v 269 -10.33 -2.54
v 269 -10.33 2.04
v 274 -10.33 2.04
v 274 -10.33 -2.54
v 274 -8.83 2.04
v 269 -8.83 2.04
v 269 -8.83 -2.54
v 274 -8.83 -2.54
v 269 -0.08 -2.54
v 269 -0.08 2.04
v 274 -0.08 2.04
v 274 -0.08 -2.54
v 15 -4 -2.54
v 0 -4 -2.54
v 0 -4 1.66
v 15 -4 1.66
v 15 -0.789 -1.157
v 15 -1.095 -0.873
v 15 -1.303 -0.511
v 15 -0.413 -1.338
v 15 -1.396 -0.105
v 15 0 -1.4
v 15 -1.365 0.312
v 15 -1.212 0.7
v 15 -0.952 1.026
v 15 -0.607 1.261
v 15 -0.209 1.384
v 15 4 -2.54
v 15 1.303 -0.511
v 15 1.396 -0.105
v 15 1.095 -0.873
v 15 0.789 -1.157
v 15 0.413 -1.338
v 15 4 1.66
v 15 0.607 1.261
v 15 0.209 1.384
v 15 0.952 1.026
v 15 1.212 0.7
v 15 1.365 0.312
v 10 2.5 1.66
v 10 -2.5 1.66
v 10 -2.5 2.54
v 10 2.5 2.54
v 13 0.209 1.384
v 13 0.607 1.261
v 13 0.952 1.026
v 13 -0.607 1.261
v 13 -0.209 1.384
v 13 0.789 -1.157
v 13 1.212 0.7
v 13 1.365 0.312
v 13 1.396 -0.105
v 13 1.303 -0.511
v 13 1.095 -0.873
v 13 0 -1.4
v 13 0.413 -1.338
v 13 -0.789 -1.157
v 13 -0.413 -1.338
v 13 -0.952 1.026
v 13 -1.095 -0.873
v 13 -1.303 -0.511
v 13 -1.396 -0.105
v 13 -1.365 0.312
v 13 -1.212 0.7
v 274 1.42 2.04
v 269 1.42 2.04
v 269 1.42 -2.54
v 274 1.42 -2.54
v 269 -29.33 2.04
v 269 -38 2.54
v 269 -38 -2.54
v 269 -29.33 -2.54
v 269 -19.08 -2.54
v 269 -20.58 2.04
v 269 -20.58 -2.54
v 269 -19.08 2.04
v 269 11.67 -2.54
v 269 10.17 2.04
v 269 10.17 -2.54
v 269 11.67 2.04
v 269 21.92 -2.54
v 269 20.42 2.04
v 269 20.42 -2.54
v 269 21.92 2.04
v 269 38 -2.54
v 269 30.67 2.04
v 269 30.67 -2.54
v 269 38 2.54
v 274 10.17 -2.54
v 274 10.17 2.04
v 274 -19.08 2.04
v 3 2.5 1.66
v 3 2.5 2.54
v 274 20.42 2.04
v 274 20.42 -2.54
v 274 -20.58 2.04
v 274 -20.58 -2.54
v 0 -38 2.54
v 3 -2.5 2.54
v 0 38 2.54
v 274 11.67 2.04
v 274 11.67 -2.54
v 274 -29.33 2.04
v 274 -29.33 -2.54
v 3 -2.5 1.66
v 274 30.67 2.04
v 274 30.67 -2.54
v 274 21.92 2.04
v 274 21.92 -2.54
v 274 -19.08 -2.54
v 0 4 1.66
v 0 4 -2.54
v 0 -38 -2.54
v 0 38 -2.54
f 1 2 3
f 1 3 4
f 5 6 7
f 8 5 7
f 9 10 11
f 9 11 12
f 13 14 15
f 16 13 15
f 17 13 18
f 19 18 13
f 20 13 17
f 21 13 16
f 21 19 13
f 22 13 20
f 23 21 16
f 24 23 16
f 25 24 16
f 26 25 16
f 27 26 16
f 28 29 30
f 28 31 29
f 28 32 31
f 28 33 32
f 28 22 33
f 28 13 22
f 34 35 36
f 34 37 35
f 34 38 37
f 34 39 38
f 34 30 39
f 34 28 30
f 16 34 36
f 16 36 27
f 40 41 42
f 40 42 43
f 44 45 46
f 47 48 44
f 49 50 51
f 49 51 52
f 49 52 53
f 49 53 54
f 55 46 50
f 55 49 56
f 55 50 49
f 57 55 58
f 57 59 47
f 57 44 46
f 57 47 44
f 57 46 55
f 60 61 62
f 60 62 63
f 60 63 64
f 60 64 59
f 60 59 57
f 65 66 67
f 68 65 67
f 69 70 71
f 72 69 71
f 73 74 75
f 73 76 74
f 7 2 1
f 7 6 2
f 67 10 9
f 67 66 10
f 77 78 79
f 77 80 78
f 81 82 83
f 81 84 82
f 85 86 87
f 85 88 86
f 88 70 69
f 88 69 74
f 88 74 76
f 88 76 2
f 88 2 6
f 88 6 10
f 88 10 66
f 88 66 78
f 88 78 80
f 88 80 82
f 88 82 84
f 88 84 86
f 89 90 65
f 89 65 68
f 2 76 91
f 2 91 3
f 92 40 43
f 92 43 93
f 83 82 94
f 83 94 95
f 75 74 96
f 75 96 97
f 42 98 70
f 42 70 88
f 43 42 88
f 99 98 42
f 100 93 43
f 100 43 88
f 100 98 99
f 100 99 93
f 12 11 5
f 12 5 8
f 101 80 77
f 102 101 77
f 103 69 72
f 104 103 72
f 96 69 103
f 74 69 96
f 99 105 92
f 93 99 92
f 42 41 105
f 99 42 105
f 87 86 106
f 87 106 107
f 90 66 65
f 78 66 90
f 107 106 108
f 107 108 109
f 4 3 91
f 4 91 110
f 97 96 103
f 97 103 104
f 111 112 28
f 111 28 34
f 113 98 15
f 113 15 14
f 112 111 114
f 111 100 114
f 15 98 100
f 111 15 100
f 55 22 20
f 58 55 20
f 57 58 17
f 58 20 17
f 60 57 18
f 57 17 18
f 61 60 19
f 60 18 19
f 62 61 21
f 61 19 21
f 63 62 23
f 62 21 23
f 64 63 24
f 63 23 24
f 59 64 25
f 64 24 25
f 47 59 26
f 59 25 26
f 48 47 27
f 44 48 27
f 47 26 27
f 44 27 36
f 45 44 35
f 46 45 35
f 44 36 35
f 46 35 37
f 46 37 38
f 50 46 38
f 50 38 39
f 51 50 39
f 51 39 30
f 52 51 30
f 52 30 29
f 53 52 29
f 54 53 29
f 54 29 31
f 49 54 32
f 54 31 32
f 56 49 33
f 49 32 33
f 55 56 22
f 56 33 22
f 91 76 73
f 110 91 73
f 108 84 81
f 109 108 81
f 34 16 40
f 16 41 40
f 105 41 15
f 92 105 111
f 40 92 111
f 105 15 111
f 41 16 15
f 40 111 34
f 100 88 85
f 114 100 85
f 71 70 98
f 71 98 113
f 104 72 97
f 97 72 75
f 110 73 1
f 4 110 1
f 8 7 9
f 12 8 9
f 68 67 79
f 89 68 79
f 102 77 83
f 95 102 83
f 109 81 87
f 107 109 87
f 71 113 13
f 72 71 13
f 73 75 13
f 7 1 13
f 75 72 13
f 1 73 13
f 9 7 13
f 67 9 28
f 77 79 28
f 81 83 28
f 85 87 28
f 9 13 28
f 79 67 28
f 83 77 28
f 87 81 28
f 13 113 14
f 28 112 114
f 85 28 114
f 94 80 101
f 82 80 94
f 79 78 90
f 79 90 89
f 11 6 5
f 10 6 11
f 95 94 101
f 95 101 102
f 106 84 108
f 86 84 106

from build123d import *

# Parameters (mm, degrees)
SKETCH1_W           = 5.08
SKETCH1_H           = 76
BOSS_EXTRUDE1_DEPTH = 269
SKETCH2_W           = 4.58
SKETCH2_H           = 8.75
BOSS_EXTRUDE2_DEPTH = 5
SKETCH5_W           = 4.2
SKETCH5_H           = 8
CUT_EXTRUDE1_DEPTH  = 15
SKETCH6_W           = 7
SKETCH6_H           = 5
CUT_EXTRUDE2_DEPTH  = 15
SKETCH8_R           = 1.4
BOSS_EXTRUDE3_DEPTH = 2


with BuildPart() as part:
    # Sketch1 → Boss-Extrude1 (new body)
    with BuildSketch(Plane(origin=(0, 0, 0), x_dir=(0, 0, -1), z_dir=(1, 0, 0))):
        Rectangle(SKETCH1_W, SKETCH1_H)
    extrude(amount=BOSS_EXTRUDE1_DEPTH)

    # Sketch2 → Boss-Extrude2 (add)
    with BuildSketch(Plane(origin=(269, 0, 0), x_dir=(0, 0, -1), z_dir=(1, 0, 0))):
        with Locations((0.25, 26.295)):
            Rectangle(SKETCH2_W, SKETCH2_H)
        with Locations((0.25, 5.795)):
            Rectangle(SKETCH2_W, SKETCH2_H)
        with Locations((0.25, 16.045)):
            Rectangle(SKETCH2_W, SKETCH2_H)
        with Locations((0.25, -4.455)):
            Rectangle(SKETCH2_W, SKETCH2_H)
        with Locations((0.25, -14.705)):
            Rectangle(SKETCH2_W, SKETCH2_H)
        with Locations((0.25, -24.955)):
            Rectangle(SKETCH2_W, SKETCH2_H)
    extrude(amount=BOSS_EXTRUDE2_DEPTH)

    # Sketch5 → Cut-Extrude1 (cut)
    with BuildSketch(Plane.ZY):
        with Locations((-0.44, 0)):
            Rectangle(SKETCH5_W, SKETCH5_H)
    extrude(amount=-CUT_EXTRUDE1_DEPTH, mode=Mode.SUBTRACT)

    # Sketch6 → Cut-Extrude2 (cut)
    with BuildSketch(Plane(origin=(0, 0, 1.66), x_dir=(-1, 0, 0), z_dir=(0, 0, -1))):
        with Locations((-6.5, 0)):
            Rectangle(SKETCH6_W, SKETCH6_H)
    extrude(amount=-CUT_EXTRUDE2_DEPTH, mode=Mode.SUBTRACT)

    # Sketch8 → Boss-Extrude3 (add)
    with BuildSketch(Plane.ZY.offset(-15)):
        with Locations(Location((0, 0, 0), (0, 0, 180))):
            Circle(SKETCH8_R)
    extrude(amount=BOSS_EXTRUDE3_DEPTH)


solid = part.part
